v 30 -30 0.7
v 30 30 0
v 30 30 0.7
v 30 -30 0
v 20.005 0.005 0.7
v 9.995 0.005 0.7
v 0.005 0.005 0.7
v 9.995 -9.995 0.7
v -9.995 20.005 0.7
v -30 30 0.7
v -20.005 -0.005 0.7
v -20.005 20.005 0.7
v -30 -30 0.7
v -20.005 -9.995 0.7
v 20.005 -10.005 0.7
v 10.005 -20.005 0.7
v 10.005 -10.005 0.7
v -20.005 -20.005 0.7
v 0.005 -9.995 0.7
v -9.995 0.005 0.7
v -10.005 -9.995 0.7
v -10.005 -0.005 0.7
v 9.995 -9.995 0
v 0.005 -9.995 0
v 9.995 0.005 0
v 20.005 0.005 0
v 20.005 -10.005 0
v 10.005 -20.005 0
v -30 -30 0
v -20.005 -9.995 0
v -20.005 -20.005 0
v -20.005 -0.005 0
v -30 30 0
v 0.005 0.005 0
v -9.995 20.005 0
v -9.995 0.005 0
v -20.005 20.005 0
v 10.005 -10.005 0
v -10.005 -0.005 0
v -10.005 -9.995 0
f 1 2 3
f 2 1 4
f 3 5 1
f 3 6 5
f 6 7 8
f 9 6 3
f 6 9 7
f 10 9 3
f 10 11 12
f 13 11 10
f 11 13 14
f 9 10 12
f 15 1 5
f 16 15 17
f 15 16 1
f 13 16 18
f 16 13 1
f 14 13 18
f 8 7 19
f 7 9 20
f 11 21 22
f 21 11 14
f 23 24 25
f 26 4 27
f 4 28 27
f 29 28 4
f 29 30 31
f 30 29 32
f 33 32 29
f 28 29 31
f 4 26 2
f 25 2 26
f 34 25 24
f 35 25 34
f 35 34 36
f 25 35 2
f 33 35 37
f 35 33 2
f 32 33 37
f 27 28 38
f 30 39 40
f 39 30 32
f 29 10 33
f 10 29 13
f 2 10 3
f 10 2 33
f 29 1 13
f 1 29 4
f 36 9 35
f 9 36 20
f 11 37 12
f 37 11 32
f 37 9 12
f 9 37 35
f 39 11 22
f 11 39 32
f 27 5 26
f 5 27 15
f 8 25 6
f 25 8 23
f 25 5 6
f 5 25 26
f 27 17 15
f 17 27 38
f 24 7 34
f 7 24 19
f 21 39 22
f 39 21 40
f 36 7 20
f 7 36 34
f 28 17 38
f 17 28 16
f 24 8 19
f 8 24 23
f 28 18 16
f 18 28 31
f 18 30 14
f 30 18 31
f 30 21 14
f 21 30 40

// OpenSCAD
difference()
{
  translate([0, 0, 0.35]) cube([60, 60, 0.7], center=true);
  translate([-15.0, 15.0, 0]) cube([10.01, 10.01, 2.0999999999999996], center=true);
  translate([-15.0, 5.0, 0]) cube([10.01, 10.01, 2.0999999999999996], center=true);
  translate([15.0, -5.0, 0]) cube([10.01, 10.01, 2.0999999999999996], center=true);
  translate([-5.0, -5.0, 0]) cube([10.01, 10.01, 2.0999999999999996], center=true);
  translate([5.0, -15.0, 0]) cube([10.01, 10.01, 2.0999999999999996], center=true);
  translate([-5.0, -15.0, 0]) cube([10.01, 10.01, 2.0999999999999996], center=true);
  translate([-15.0, -15.0, 0]) cube([10.01, 10.01, 2.0999999999999996], center=true);
}
